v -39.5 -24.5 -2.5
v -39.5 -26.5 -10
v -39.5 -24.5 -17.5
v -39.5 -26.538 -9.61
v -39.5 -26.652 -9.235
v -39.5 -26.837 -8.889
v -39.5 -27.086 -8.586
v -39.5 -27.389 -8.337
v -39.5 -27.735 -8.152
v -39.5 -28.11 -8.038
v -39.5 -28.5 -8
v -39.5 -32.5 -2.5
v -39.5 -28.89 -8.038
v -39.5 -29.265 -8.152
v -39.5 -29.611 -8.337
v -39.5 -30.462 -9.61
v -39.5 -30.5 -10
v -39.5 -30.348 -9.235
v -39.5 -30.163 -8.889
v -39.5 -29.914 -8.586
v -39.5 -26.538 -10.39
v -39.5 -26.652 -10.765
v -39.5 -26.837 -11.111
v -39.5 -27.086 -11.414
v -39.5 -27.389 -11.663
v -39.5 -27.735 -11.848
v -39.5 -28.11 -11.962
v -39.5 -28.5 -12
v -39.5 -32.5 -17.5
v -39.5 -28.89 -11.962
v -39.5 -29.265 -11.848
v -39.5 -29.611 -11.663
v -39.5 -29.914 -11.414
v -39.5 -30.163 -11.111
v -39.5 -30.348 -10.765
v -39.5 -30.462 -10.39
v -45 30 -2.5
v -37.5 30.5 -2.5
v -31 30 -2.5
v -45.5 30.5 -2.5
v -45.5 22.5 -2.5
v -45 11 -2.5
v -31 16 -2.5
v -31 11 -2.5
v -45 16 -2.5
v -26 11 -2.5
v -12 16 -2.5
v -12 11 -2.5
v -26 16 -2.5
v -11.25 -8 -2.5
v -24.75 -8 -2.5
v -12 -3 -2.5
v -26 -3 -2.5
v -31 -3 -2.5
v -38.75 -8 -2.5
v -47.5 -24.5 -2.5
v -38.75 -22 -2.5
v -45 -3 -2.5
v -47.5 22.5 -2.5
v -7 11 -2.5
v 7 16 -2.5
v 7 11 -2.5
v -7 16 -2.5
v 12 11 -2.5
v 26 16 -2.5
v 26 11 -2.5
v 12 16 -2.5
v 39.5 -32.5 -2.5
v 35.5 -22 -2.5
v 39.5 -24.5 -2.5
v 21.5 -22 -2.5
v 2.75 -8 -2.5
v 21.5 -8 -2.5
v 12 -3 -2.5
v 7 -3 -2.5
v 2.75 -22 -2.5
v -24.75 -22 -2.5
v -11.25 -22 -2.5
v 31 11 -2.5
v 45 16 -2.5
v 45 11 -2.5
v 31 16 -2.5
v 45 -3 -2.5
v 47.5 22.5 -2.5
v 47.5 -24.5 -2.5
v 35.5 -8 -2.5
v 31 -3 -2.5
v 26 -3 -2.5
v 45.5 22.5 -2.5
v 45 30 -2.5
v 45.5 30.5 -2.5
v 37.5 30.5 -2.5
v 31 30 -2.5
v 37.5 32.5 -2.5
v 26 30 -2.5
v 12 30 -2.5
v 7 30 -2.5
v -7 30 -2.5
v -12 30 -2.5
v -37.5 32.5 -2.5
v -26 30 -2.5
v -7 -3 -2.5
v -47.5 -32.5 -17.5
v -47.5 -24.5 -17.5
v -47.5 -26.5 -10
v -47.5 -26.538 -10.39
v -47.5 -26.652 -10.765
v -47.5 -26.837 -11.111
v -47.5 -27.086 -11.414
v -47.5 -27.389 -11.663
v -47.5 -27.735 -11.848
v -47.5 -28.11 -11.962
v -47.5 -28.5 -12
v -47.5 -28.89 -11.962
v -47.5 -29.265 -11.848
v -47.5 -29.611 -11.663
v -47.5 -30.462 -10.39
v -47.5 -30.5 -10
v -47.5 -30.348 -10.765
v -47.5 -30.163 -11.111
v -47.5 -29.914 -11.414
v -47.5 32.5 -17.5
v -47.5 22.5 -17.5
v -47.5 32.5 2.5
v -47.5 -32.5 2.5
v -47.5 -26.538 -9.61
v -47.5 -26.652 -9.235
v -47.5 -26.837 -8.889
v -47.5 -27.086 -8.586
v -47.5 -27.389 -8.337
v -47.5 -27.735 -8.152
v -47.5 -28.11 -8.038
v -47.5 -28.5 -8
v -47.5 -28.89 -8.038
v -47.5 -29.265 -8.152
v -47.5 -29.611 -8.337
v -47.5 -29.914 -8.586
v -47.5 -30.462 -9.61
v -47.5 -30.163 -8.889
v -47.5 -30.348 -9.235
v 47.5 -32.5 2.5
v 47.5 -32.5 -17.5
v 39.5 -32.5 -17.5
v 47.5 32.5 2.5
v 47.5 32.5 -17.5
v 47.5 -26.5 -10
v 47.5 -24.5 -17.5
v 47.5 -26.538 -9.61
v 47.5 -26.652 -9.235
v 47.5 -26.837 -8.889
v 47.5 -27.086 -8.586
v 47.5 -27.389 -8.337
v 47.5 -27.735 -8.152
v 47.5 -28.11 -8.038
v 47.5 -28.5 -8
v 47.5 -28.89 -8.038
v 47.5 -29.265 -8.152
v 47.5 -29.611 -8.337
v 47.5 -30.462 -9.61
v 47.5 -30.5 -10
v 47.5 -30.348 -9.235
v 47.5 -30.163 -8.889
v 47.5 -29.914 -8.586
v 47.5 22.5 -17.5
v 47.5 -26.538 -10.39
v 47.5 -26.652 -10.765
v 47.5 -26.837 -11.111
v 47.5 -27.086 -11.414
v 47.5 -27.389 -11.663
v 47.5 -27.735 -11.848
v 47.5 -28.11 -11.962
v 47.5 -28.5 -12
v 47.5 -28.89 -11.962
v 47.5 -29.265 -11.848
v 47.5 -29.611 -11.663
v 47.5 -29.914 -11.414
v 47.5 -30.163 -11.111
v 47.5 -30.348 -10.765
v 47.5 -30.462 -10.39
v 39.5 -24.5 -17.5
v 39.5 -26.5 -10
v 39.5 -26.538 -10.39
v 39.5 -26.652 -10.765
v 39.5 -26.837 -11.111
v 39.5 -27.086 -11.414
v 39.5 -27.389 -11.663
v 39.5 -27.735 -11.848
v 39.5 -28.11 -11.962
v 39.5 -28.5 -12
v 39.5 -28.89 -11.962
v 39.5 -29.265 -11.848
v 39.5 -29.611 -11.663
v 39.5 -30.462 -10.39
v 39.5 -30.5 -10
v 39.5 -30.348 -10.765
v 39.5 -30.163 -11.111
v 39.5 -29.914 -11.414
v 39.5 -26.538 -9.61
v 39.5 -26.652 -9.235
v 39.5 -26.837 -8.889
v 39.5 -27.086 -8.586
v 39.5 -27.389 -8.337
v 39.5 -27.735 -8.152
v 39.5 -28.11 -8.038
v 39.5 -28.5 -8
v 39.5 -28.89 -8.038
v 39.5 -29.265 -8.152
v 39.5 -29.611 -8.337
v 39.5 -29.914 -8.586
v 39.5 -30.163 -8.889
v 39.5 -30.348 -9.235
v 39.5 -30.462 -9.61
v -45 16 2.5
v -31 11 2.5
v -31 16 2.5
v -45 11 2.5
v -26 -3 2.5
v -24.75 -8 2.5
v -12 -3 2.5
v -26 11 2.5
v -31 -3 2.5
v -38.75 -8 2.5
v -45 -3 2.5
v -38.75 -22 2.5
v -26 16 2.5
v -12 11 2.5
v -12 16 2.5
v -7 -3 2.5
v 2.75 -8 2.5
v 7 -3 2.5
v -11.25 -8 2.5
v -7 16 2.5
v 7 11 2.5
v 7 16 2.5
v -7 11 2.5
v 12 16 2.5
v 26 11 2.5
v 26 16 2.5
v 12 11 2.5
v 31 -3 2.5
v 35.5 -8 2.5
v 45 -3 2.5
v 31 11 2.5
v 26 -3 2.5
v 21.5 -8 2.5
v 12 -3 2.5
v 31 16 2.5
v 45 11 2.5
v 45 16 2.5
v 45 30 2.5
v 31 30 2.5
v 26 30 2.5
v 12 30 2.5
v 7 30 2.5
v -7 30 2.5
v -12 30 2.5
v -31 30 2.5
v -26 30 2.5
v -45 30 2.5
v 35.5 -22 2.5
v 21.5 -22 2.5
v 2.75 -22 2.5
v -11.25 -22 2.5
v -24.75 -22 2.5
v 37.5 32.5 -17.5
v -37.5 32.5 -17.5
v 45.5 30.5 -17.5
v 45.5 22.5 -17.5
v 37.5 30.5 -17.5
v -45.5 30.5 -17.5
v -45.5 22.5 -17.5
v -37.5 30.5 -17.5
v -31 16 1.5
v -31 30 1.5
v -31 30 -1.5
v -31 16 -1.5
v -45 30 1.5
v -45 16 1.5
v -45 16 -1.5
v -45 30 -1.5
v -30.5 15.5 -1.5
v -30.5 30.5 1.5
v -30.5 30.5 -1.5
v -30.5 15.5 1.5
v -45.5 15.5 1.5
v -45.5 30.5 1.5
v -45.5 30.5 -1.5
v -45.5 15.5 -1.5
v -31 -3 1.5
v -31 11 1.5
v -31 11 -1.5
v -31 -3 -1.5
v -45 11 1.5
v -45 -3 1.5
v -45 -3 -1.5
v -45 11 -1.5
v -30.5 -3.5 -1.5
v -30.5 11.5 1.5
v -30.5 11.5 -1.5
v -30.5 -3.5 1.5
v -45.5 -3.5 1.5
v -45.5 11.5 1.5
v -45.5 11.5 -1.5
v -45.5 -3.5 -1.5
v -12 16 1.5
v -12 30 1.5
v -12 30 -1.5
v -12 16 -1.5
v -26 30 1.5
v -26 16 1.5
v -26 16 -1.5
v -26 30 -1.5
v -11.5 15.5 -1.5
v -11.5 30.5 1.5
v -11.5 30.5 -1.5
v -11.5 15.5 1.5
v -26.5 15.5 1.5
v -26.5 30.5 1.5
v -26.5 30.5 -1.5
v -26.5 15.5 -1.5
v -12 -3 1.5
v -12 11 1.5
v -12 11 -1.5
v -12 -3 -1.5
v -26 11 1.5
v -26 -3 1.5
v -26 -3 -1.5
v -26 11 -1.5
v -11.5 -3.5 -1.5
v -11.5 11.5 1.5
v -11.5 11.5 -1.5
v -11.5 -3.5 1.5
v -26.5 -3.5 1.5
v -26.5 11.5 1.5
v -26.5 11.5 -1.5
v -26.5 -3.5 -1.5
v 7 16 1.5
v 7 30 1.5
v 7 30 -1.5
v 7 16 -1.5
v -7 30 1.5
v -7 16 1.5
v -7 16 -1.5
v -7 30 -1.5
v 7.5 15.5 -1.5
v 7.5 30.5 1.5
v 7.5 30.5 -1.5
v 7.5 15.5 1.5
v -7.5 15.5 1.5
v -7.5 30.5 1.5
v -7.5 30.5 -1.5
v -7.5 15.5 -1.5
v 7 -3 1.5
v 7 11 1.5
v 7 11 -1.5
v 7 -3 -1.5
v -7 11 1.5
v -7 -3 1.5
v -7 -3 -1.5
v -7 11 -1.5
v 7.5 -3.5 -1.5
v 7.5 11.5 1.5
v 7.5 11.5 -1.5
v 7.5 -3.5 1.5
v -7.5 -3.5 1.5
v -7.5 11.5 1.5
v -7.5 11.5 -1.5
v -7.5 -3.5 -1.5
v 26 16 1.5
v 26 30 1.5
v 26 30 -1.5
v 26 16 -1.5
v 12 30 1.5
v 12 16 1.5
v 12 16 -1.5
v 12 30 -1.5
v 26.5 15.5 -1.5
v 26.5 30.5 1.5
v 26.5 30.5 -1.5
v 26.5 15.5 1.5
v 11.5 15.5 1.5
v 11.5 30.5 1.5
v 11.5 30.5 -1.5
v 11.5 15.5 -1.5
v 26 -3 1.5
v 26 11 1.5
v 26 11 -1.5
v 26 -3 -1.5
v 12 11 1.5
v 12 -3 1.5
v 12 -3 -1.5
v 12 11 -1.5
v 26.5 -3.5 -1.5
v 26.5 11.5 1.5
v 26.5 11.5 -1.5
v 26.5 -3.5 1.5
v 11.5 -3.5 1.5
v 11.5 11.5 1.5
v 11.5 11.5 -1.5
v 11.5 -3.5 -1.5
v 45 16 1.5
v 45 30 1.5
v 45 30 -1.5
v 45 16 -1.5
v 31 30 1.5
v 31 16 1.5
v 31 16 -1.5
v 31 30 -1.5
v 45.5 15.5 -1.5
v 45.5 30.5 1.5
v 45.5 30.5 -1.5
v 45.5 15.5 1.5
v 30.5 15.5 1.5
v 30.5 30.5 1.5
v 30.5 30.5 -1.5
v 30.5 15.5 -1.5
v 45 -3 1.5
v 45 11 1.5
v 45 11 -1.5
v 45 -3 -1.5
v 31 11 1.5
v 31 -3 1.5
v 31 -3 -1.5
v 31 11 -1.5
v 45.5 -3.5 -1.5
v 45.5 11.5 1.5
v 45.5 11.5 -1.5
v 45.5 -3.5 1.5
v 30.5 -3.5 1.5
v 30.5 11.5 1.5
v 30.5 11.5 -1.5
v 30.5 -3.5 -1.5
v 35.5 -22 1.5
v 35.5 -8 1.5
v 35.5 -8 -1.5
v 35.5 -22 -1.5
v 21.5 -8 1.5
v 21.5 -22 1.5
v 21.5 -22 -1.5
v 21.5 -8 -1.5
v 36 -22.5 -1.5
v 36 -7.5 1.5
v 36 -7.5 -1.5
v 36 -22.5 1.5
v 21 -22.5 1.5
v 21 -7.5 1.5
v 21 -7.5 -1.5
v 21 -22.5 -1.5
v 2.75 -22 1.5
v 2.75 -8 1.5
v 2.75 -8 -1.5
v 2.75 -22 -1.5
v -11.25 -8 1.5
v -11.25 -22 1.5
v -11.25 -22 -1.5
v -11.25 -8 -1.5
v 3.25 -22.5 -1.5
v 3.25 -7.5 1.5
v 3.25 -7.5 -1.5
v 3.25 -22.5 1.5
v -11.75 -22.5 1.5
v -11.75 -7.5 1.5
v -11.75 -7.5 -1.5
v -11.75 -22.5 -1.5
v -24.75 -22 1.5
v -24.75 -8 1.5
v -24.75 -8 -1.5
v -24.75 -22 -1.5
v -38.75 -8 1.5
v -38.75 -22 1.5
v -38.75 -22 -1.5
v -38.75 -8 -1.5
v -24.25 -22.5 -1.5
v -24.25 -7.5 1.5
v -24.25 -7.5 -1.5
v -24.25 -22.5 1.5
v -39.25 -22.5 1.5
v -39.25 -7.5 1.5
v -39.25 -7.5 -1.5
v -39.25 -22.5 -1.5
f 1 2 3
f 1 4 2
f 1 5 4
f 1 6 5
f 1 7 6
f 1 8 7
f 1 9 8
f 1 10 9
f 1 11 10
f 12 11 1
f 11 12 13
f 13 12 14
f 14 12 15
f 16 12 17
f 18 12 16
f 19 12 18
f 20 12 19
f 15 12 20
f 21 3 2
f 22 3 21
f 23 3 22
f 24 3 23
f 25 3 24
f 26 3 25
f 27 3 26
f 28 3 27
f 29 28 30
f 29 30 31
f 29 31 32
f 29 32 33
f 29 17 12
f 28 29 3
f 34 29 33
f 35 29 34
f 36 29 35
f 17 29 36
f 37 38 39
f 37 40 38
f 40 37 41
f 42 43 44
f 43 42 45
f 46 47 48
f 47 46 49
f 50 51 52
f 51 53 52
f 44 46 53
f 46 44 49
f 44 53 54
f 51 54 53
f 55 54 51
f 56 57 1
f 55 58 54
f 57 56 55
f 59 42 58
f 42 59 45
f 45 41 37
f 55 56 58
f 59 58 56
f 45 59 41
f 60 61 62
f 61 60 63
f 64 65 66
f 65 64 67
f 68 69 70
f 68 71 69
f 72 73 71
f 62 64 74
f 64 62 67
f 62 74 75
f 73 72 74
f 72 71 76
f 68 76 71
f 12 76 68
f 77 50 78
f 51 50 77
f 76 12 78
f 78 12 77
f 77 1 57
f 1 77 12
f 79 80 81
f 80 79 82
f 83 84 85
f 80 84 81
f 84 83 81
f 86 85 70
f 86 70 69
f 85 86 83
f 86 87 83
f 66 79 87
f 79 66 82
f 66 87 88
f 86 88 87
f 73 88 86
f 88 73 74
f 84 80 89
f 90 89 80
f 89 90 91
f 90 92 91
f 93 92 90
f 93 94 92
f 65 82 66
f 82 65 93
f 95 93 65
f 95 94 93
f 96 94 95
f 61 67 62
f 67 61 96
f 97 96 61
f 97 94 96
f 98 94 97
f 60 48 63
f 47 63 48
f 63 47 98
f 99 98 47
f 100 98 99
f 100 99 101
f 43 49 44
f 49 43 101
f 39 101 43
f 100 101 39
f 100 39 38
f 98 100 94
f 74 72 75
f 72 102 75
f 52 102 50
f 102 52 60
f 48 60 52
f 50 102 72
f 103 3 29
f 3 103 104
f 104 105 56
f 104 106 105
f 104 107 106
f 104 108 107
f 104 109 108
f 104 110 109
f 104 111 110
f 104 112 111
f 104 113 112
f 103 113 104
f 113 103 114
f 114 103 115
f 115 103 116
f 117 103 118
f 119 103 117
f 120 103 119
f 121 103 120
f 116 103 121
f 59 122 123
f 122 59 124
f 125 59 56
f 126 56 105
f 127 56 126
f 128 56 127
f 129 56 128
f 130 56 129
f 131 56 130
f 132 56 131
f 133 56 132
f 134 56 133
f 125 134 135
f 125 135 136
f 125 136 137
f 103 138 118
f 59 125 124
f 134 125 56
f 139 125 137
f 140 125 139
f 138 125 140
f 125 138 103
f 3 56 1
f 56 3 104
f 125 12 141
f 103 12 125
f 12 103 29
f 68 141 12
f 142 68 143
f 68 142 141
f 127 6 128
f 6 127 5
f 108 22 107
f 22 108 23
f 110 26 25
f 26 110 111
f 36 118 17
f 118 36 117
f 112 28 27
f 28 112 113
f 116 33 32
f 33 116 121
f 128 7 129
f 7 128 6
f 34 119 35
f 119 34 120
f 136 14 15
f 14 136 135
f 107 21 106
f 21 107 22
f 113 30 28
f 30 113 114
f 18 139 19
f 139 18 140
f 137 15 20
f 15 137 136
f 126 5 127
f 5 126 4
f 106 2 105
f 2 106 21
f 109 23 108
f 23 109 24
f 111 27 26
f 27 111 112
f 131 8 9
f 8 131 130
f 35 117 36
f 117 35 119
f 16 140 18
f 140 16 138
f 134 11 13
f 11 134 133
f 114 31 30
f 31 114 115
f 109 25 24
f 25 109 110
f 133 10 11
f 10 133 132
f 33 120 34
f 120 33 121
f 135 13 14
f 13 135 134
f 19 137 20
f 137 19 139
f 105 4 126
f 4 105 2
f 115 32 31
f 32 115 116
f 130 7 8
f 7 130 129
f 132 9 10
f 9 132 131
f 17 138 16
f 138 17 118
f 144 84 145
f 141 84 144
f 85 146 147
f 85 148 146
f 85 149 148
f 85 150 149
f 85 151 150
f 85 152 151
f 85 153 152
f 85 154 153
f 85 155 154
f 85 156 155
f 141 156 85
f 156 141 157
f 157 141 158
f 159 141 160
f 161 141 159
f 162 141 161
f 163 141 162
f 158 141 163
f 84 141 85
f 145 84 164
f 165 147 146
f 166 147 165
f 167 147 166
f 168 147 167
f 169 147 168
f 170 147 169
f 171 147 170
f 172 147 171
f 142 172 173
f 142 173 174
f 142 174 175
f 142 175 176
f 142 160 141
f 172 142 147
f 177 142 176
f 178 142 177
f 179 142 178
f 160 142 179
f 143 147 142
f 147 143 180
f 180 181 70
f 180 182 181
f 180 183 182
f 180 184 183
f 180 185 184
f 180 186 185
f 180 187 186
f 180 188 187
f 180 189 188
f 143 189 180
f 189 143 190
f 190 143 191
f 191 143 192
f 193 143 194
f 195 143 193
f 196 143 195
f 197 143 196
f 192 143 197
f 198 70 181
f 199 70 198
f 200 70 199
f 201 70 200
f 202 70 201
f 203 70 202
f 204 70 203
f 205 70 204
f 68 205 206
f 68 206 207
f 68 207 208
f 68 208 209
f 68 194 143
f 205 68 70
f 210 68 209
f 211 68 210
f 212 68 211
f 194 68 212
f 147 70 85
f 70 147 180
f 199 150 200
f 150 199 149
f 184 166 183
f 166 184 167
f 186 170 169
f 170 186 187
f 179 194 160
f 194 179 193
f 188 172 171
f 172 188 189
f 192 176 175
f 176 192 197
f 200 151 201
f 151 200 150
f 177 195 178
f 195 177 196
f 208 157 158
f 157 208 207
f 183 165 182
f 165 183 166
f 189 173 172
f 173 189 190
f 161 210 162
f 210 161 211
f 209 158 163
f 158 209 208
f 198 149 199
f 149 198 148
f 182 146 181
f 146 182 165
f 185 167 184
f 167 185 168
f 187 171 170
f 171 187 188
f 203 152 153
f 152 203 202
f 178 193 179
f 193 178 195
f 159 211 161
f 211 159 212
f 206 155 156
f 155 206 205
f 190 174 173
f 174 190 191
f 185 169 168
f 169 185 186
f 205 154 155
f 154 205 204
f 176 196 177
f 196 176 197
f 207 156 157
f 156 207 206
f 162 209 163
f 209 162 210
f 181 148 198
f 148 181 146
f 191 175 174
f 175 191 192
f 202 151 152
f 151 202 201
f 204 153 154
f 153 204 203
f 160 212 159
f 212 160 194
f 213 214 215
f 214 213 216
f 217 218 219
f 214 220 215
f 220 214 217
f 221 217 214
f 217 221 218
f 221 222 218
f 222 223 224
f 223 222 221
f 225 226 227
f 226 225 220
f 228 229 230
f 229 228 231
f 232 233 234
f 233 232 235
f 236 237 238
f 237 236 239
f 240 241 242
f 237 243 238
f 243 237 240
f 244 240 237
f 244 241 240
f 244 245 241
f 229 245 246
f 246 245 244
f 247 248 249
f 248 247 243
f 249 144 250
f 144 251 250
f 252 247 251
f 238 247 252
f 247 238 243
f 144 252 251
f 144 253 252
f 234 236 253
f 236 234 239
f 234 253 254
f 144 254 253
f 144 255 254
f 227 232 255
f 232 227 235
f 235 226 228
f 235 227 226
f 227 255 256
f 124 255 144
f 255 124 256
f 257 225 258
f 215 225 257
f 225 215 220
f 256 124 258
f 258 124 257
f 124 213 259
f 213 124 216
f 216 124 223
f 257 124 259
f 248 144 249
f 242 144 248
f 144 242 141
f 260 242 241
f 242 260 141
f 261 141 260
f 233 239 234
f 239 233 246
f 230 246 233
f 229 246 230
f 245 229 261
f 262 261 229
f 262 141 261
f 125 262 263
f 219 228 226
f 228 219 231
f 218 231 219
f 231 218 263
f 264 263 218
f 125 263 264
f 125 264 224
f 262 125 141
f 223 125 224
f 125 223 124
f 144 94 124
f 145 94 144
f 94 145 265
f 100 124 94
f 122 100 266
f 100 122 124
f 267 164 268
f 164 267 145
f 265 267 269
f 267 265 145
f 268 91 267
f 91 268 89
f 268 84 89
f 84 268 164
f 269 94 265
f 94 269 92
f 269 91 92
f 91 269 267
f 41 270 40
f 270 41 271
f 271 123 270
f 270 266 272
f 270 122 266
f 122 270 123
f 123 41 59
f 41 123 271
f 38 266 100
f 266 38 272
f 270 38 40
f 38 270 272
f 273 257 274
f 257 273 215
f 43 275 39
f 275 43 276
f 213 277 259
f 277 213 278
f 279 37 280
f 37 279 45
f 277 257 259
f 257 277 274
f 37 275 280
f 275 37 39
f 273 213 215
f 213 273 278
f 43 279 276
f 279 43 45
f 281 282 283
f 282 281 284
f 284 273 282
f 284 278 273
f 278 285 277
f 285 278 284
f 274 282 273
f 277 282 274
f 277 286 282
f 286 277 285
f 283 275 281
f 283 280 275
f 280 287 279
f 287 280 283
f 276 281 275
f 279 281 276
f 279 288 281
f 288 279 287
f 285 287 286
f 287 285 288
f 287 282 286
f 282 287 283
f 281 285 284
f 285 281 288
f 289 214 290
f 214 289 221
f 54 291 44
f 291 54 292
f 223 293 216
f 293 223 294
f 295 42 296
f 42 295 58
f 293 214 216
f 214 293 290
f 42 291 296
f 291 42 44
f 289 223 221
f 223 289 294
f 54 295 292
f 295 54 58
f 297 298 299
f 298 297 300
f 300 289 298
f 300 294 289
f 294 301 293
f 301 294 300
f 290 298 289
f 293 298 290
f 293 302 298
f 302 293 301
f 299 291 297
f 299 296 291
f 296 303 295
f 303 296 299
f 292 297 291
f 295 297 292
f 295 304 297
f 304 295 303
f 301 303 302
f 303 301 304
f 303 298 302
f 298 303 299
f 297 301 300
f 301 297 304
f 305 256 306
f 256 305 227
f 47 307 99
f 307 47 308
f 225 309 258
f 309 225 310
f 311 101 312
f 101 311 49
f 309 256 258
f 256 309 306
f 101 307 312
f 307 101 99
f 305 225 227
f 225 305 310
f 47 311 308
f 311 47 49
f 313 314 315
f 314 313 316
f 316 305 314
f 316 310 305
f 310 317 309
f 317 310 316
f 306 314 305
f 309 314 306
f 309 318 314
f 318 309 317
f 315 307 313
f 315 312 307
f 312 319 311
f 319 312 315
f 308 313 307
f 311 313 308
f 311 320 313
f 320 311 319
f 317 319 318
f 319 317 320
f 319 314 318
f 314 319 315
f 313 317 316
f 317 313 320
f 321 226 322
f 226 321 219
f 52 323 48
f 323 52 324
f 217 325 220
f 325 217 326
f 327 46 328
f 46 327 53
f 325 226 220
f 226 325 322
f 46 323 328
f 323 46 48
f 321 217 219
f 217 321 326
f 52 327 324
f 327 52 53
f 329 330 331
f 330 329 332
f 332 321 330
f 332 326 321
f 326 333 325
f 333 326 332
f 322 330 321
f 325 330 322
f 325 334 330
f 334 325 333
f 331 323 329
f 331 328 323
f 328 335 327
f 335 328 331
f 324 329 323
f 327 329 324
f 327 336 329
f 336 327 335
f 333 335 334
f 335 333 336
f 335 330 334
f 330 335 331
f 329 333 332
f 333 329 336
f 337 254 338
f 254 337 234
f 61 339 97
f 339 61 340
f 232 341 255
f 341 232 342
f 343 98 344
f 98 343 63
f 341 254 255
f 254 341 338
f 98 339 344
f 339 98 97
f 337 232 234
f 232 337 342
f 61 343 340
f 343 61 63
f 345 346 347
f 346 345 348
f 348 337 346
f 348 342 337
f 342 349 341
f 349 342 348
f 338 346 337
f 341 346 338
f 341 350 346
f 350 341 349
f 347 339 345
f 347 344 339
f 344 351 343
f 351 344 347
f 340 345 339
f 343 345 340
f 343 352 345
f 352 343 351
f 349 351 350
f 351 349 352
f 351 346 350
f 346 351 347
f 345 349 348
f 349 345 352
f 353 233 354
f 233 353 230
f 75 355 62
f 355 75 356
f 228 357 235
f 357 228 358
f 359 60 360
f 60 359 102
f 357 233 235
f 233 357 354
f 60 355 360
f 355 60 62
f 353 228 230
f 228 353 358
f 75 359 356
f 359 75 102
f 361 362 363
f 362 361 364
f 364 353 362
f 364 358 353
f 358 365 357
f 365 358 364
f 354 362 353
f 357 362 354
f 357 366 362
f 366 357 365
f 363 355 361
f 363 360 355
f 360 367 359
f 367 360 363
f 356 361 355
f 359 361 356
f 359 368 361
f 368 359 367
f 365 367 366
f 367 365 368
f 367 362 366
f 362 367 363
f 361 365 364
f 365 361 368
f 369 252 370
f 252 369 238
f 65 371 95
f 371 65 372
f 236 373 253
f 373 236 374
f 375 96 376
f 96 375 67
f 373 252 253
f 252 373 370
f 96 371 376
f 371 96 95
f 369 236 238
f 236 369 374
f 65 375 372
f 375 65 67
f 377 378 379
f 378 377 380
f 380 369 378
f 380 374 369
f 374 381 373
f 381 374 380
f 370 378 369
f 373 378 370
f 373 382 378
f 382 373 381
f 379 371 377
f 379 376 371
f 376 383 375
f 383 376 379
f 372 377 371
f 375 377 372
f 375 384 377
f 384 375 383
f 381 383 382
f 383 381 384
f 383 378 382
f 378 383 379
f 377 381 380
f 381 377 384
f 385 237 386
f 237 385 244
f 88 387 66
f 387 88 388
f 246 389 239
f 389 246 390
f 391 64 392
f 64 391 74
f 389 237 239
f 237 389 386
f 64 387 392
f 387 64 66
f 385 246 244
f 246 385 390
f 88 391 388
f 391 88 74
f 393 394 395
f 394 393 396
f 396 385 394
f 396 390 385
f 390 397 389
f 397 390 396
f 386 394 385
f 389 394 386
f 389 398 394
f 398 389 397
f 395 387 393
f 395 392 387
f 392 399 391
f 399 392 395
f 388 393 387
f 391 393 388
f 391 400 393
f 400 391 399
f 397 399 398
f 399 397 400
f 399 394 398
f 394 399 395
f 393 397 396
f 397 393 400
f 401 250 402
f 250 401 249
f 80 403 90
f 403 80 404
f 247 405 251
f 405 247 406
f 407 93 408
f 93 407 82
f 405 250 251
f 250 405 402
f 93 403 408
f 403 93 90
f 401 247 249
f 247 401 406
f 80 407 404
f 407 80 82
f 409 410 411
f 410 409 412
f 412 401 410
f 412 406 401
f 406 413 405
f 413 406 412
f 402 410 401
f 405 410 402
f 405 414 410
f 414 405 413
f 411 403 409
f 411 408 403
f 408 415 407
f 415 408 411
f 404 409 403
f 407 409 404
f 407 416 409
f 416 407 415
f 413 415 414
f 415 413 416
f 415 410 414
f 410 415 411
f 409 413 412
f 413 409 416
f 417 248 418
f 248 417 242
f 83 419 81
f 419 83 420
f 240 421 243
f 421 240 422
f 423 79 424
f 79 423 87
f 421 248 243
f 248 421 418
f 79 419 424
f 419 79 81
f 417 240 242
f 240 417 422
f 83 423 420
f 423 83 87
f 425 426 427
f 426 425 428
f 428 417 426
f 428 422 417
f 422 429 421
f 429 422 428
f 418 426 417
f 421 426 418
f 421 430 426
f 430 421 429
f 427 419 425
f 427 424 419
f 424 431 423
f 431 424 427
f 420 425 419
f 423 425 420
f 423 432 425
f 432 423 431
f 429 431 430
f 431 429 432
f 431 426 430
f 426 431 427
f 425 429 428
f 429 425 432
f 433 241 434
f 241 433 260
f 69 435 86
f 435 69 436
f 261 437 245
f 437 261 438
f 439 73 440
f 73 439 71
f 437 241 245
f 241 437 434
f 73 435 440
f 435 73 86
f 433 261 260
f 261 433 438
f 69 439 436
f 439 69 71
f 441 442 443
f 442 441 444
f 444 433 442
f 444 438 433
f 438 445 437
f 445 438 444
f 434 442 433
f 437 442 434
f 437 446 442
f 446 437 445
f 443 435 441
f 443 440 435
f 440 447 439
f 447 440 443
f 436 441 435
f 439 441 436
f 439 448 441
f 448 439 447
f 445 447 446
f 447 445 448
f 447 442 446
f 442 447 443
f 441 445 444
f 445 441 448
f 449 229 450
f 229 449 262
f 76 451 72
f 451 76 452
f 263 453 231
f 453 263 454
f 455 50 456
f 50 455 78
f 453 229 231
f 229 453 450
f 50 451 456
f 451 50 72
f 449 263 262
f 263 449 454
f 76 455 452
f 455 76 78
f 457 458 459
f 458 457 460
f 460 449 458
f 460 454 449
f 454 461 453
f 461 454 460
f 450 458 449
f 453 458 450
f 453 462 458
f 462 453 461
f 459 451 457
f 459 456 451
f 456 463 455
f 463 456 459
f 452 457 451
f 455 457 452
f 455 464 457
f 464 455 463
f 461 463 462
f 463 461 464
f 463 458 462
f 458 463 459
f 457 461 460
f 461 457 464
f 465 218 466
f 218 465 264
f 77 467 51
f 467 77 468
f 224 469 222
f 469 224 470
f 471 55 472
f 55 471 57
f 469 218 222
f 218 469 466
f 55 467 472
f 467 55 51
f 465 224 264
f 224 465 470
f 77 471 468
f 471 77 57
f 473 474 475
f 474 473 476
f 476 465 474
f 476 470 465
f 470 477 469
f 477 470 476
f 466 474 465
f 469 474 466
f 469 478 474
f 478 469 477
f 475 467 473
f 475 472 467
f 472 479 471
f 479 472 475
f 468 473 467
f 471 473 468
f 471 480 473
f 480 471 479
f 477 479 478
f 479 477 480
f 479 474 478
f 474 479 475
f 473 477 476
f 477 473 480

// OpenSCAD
// file: common.scad
key_size = 14;

b_post = 8;
m_post_s = 2;
m_post_l = 10;
post_z = 15;

plat_z = 5;

module keyhole(x, y) {
  translate([x, y, 0]) {
    cube([key_size, key_size, plat_z + 1], center = true);
    cube([key_size + 1, key_size + 1, plat_z -2], center = true);
  }
}

module e_post(x, y, z) {
  translate([x, y, -(plat_z + post_z)/2]) {
    cube([b_post, b_post, post_z], center = true);
  }
}

module e_post_i(x, y, r) {
  translate([x, y, -(plat_z + post_z)/2]) {
    difference() {
      cube([b_post, b_post, post_z], center = true);
      rotate(r) cylinder(h=b_post+1, r=2, center=true, $fn=32);
    }
  }
}

module e_post_x(x, y) {
  e_post_i(x, y, [0, 90, 0]);
}


module e_post_y(x, y) {
  e_post_i(x, y, [90, 0, 0]);
}

module i_post_x(x, y) {
  translate([x, y, -(plat_z + post_z)/2]) cube([m_post_l, m_post_s, post_z], center = true);
}

module i_post_y(x, y) {
  translate([x, y, -(plat_z + post_z)/2]) cube([m_post_s, m_post_l, post_z], center = true);
}
// file: parameters.scad
key_size = 14;
key_sep = 5;
m_key_sep = 13.5;
l_key_sep = 33;

border = 8;
b_post = 8;
m_post_s = 2;
m_post_l = 10;
post_z = 15;

key_cell = key_size + key_sep;
m_key_cell_x = key_size + m_key_sep;
l_key_cell_x = 2*key_cell;

plat_z = 5;
// main file
// Ortho Mega section 6: bottom mid-left section

include <parameters.scad>

plat_x = 5*key_cell;
plat_y = border + 3*key_cell;

use <common.scad>

difference() {
  union() {
    cube([plat_x, plat_y, 5], center = true);
    e_post_x(-(plat_x-b_post)/2, -(plat_y-b_post)/2);
    
    e_post_x((plat_x-b_post)/2, -(plat_y-b_post)/2);

    i_post_y((plat_x - m_post_s)/2, (plat_y - m_post_l)/2);
    i_post_x((plat_x - m_post_l)/2, (plat_y - m_post_s)/2);
    
    i_post_y(-(plat_x - m_post_s)/2, (plat_y - m_post_l)/2);
    i_post_x(-(plat_x - m_post_l)/2, (plat_y - m_post_s)/2);
  }

  for (x = [0:4]) {
    for (y = [0:1]) {
      keyhole(-plat_x/2 + key_cell/2 + x*key_cell, plat_y/2 - key_cell/2 - y*key_cell);
    }
  }
  keyhole(plat_x/2 - l_key_cell_x/2, plat_y/2 - key_cell/2 - 2*key_cell);
  keyhole(plat_x/2 - l_key_cell_x - m_key_cell_x/2, plat_y/2 - key_cell/2 - 2*key_cell);
  keyhole(plat_x/2 - l_key_cell_x - +m_key_cell_x - m_key_cell_x/2, plat_y/2 - key_cell/2 - 2*key_cell);
}
